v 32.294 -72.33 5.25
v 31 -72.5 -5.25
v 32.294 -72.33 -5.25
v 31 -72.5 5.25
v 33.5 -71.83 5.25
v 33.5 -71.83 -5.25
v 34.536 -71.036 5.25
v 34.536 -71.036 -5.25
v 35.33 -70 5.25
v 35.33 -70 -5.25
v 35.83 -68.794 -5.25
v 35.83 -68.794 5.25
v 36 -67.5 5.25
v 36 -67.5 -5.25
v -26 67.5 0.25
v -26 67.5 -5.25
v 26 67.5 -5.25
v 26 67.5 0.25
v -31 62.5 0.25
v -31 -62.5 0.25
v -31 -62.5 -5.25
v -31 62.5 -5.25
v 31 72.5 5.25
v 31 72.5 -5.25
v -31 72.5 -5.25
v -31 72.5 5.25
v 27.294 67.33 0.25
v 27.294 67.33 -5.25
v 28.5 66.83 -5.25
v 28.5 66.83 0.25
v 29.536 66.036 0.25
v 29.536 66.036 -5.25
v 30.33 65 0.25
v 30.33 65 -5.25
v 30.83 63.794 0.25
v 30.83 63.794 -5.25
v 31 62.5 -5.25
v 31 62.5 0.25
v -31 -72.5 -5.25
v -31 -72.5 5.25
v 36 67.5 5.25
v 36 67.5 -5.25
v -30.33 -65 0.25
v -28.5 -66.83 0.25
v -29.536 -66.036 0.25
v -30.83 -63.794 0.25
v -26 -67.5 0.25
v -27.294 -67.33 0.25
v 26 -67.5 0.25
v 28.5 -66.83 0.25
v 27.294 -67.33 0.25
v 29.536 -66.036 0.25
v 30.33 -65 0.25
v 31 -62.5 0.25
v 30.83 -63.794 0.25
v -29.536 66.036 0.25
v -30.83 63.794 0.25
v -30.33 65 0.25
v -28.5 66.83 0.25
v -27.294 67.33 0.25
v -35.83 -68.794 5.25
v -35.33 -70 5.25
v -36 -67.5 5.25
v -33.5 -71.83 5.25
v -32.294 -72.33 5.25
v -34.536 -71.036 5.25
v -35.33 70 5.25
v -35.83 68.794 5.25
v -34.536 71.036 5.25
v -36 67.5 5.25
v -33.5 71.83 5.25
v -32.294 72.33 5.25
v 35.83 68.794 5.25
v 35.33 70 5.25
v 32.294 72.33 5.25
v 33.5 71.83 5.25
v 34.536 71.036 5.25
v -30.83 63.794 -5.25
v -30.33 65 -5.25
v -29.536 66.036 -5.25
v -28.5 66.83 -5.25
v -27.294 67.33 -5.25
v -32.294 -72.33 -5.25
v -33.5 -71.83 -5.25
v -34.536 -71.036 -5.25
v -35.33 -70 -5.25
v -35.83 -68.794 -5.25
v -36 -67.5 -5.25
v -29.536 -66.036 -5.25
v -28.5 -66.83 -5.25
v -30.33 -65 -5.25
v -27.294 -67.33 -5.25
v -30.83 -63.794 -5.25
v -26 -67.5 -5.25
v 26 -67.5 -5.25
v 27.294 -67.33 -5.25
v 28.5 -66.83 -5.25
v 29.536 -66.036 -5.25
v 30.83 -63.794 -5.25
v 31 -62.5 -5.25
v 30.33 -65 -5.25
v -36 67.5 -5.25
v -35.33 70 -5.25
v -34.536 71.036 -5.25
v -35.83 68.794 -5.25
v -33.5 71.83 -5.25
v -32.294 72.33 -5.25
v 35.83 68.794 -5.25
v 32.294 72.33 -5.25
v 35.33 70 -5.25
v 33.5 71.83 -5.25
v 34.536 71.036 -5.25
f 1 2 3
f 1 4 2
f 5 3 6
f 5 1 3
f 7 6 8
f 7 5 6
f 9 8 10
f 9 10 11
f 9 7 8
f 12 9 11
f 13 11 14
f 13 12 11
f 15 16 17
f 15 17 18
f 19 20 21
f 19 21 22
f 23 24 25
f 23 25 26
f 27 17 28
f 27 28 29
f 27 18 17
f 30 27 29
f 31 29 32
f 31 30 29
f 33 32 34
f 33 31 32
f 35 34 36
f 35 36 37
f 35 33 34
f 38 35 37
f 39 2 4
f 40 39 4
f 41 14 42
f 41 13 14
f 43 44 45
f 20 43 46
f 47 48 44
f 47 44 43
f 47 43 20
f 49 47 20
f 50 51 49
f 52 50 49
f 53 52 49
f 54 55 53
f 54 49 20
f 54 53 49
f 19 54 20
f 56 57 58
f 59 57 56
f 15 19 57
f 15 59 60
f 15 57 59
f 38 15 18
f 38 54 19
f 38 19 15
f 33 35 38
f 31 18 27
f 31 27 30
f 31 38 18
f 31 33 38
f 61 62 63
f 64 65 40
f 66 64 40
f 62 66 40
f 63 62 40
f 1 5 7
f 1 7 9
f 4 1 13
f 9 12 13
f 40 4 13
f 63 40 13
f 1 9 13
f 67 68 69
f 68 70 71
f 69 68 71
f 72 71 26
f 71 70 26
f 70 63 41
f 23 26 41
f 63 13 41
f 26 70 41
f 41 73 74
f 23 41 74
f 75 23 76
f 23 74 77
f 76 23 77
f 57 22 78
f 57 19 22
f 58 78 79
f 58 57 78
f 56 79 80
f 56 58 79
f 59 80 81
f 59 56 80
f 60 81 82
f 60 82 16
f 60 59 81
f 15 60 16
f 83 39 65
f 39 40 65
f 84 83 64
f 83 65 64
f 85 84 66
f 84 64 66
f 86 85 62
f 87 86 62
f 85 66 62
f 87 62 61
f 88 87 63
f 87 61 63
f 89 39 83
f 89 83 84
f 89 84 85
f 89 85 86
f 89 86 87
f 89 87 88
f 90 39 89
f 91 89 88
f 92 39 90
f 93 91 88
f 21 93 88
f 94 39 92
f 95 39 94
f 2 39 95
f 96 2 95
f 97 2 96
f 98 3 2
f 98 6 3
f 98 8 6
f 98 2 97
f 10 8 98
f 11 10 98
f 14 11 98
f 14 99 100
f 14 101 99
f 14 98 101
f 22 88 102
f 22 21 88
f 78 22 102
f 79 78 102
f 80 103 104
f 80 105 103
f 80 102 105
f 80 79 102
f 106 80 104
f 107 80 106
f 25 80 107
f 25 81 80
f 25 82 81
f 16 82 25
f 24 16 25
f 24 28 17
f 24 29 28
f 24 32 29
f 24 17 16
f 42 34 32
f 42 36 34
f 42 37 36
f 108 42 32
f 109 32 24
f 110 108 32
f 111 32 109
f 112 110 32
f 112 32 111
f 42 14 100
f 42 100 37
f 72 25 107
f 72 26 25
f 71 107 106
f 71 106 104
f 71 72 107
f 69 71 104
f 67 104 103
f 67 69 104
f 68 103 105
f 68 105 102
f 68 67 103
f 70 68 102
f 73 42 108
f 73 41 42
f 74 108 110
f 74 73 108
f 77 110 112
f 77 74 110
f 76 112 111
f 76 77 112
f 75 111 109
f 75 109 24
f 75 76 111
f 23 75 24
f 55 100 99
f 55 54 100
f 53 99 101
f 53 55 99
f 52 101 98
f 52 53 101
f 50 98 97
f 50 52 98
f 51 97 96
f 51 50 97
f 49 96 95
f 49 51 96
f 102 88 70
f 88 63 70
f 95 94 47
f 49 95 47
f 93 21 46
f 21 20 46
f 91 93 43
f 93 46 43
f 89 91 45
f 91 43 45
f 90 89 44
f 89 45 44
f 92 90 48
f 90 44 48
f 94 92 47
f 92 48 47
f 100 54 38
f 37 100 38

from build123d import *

# Parameters (mm, degrees)
F0_W     = 145
F0_H     = 10.5
F1_DEPTH = 36
F2_R     = 5
F3_T     = 5
F4_R     = 5


# Not quite as in the source:
# - a shell that OpenCascade refuses in one call is made with other operations: the cavity is built on its own and cut out


with BuildPart() as f1:
    # F0 (on Right) → F1 (new body, symmetric)
    with BuildSketch(Plane.YZ):
        Rectangle(F0_W, F0_H)
    extrude(amount=F1_DEPTH, both=True)

    # F2
    f2_edges = [f1.edges().sort_by_distance(p)[0] for p in [
        (36, -72.5, 0),
        (36, 72.5, 0),
        (-36, -72.5, 0),
        (-36, 72.5, 0),
    ]]
    fillet(f2_edges, radius=F2_R)

    # F3: shell of thickness 5, made by hand


with BuildPart() as f3_core1:
    # F3_t2: copy of F1
    add(f1.part)

    # the walls: a layer under each face that stays
    f3_faces = [f3_core1.faces().sort_by_distance(p)[0] for p in [
        (-36, 0, 0),
        (0, -72.5, 0),
        (0, 72.5, 0),
        (36, 0, 0),
        (0, 0, 5.25),
    ]]
    thicken(f3_faces, amount=-F3_T, mode=Mode.SUBTRACT)


with BuildPart() as f1_1:
    add(f1.part)

    # what is left inside the walls is the cavity
    f3_cavity = [f3_core1.part.solids().sort_by_distance(p)[0] for p in [
        (-10.333333, 0, -5.2),
    ]]
    add(f3_cavity, mode=Mode.SUBTRACT)

    # F4
    f4_edges = [f1_1.edges().sort_by_distance(p)[0] for p in [
        (-31, -67.5, -2.5),
        (31, -67.5, -2.5),
        (-31, 67.5, -2.5),
        (31, 67.5, -2.5),
    ]]
    fillet(f4_edges, radius=F4_R)


solid = f1_1.part
